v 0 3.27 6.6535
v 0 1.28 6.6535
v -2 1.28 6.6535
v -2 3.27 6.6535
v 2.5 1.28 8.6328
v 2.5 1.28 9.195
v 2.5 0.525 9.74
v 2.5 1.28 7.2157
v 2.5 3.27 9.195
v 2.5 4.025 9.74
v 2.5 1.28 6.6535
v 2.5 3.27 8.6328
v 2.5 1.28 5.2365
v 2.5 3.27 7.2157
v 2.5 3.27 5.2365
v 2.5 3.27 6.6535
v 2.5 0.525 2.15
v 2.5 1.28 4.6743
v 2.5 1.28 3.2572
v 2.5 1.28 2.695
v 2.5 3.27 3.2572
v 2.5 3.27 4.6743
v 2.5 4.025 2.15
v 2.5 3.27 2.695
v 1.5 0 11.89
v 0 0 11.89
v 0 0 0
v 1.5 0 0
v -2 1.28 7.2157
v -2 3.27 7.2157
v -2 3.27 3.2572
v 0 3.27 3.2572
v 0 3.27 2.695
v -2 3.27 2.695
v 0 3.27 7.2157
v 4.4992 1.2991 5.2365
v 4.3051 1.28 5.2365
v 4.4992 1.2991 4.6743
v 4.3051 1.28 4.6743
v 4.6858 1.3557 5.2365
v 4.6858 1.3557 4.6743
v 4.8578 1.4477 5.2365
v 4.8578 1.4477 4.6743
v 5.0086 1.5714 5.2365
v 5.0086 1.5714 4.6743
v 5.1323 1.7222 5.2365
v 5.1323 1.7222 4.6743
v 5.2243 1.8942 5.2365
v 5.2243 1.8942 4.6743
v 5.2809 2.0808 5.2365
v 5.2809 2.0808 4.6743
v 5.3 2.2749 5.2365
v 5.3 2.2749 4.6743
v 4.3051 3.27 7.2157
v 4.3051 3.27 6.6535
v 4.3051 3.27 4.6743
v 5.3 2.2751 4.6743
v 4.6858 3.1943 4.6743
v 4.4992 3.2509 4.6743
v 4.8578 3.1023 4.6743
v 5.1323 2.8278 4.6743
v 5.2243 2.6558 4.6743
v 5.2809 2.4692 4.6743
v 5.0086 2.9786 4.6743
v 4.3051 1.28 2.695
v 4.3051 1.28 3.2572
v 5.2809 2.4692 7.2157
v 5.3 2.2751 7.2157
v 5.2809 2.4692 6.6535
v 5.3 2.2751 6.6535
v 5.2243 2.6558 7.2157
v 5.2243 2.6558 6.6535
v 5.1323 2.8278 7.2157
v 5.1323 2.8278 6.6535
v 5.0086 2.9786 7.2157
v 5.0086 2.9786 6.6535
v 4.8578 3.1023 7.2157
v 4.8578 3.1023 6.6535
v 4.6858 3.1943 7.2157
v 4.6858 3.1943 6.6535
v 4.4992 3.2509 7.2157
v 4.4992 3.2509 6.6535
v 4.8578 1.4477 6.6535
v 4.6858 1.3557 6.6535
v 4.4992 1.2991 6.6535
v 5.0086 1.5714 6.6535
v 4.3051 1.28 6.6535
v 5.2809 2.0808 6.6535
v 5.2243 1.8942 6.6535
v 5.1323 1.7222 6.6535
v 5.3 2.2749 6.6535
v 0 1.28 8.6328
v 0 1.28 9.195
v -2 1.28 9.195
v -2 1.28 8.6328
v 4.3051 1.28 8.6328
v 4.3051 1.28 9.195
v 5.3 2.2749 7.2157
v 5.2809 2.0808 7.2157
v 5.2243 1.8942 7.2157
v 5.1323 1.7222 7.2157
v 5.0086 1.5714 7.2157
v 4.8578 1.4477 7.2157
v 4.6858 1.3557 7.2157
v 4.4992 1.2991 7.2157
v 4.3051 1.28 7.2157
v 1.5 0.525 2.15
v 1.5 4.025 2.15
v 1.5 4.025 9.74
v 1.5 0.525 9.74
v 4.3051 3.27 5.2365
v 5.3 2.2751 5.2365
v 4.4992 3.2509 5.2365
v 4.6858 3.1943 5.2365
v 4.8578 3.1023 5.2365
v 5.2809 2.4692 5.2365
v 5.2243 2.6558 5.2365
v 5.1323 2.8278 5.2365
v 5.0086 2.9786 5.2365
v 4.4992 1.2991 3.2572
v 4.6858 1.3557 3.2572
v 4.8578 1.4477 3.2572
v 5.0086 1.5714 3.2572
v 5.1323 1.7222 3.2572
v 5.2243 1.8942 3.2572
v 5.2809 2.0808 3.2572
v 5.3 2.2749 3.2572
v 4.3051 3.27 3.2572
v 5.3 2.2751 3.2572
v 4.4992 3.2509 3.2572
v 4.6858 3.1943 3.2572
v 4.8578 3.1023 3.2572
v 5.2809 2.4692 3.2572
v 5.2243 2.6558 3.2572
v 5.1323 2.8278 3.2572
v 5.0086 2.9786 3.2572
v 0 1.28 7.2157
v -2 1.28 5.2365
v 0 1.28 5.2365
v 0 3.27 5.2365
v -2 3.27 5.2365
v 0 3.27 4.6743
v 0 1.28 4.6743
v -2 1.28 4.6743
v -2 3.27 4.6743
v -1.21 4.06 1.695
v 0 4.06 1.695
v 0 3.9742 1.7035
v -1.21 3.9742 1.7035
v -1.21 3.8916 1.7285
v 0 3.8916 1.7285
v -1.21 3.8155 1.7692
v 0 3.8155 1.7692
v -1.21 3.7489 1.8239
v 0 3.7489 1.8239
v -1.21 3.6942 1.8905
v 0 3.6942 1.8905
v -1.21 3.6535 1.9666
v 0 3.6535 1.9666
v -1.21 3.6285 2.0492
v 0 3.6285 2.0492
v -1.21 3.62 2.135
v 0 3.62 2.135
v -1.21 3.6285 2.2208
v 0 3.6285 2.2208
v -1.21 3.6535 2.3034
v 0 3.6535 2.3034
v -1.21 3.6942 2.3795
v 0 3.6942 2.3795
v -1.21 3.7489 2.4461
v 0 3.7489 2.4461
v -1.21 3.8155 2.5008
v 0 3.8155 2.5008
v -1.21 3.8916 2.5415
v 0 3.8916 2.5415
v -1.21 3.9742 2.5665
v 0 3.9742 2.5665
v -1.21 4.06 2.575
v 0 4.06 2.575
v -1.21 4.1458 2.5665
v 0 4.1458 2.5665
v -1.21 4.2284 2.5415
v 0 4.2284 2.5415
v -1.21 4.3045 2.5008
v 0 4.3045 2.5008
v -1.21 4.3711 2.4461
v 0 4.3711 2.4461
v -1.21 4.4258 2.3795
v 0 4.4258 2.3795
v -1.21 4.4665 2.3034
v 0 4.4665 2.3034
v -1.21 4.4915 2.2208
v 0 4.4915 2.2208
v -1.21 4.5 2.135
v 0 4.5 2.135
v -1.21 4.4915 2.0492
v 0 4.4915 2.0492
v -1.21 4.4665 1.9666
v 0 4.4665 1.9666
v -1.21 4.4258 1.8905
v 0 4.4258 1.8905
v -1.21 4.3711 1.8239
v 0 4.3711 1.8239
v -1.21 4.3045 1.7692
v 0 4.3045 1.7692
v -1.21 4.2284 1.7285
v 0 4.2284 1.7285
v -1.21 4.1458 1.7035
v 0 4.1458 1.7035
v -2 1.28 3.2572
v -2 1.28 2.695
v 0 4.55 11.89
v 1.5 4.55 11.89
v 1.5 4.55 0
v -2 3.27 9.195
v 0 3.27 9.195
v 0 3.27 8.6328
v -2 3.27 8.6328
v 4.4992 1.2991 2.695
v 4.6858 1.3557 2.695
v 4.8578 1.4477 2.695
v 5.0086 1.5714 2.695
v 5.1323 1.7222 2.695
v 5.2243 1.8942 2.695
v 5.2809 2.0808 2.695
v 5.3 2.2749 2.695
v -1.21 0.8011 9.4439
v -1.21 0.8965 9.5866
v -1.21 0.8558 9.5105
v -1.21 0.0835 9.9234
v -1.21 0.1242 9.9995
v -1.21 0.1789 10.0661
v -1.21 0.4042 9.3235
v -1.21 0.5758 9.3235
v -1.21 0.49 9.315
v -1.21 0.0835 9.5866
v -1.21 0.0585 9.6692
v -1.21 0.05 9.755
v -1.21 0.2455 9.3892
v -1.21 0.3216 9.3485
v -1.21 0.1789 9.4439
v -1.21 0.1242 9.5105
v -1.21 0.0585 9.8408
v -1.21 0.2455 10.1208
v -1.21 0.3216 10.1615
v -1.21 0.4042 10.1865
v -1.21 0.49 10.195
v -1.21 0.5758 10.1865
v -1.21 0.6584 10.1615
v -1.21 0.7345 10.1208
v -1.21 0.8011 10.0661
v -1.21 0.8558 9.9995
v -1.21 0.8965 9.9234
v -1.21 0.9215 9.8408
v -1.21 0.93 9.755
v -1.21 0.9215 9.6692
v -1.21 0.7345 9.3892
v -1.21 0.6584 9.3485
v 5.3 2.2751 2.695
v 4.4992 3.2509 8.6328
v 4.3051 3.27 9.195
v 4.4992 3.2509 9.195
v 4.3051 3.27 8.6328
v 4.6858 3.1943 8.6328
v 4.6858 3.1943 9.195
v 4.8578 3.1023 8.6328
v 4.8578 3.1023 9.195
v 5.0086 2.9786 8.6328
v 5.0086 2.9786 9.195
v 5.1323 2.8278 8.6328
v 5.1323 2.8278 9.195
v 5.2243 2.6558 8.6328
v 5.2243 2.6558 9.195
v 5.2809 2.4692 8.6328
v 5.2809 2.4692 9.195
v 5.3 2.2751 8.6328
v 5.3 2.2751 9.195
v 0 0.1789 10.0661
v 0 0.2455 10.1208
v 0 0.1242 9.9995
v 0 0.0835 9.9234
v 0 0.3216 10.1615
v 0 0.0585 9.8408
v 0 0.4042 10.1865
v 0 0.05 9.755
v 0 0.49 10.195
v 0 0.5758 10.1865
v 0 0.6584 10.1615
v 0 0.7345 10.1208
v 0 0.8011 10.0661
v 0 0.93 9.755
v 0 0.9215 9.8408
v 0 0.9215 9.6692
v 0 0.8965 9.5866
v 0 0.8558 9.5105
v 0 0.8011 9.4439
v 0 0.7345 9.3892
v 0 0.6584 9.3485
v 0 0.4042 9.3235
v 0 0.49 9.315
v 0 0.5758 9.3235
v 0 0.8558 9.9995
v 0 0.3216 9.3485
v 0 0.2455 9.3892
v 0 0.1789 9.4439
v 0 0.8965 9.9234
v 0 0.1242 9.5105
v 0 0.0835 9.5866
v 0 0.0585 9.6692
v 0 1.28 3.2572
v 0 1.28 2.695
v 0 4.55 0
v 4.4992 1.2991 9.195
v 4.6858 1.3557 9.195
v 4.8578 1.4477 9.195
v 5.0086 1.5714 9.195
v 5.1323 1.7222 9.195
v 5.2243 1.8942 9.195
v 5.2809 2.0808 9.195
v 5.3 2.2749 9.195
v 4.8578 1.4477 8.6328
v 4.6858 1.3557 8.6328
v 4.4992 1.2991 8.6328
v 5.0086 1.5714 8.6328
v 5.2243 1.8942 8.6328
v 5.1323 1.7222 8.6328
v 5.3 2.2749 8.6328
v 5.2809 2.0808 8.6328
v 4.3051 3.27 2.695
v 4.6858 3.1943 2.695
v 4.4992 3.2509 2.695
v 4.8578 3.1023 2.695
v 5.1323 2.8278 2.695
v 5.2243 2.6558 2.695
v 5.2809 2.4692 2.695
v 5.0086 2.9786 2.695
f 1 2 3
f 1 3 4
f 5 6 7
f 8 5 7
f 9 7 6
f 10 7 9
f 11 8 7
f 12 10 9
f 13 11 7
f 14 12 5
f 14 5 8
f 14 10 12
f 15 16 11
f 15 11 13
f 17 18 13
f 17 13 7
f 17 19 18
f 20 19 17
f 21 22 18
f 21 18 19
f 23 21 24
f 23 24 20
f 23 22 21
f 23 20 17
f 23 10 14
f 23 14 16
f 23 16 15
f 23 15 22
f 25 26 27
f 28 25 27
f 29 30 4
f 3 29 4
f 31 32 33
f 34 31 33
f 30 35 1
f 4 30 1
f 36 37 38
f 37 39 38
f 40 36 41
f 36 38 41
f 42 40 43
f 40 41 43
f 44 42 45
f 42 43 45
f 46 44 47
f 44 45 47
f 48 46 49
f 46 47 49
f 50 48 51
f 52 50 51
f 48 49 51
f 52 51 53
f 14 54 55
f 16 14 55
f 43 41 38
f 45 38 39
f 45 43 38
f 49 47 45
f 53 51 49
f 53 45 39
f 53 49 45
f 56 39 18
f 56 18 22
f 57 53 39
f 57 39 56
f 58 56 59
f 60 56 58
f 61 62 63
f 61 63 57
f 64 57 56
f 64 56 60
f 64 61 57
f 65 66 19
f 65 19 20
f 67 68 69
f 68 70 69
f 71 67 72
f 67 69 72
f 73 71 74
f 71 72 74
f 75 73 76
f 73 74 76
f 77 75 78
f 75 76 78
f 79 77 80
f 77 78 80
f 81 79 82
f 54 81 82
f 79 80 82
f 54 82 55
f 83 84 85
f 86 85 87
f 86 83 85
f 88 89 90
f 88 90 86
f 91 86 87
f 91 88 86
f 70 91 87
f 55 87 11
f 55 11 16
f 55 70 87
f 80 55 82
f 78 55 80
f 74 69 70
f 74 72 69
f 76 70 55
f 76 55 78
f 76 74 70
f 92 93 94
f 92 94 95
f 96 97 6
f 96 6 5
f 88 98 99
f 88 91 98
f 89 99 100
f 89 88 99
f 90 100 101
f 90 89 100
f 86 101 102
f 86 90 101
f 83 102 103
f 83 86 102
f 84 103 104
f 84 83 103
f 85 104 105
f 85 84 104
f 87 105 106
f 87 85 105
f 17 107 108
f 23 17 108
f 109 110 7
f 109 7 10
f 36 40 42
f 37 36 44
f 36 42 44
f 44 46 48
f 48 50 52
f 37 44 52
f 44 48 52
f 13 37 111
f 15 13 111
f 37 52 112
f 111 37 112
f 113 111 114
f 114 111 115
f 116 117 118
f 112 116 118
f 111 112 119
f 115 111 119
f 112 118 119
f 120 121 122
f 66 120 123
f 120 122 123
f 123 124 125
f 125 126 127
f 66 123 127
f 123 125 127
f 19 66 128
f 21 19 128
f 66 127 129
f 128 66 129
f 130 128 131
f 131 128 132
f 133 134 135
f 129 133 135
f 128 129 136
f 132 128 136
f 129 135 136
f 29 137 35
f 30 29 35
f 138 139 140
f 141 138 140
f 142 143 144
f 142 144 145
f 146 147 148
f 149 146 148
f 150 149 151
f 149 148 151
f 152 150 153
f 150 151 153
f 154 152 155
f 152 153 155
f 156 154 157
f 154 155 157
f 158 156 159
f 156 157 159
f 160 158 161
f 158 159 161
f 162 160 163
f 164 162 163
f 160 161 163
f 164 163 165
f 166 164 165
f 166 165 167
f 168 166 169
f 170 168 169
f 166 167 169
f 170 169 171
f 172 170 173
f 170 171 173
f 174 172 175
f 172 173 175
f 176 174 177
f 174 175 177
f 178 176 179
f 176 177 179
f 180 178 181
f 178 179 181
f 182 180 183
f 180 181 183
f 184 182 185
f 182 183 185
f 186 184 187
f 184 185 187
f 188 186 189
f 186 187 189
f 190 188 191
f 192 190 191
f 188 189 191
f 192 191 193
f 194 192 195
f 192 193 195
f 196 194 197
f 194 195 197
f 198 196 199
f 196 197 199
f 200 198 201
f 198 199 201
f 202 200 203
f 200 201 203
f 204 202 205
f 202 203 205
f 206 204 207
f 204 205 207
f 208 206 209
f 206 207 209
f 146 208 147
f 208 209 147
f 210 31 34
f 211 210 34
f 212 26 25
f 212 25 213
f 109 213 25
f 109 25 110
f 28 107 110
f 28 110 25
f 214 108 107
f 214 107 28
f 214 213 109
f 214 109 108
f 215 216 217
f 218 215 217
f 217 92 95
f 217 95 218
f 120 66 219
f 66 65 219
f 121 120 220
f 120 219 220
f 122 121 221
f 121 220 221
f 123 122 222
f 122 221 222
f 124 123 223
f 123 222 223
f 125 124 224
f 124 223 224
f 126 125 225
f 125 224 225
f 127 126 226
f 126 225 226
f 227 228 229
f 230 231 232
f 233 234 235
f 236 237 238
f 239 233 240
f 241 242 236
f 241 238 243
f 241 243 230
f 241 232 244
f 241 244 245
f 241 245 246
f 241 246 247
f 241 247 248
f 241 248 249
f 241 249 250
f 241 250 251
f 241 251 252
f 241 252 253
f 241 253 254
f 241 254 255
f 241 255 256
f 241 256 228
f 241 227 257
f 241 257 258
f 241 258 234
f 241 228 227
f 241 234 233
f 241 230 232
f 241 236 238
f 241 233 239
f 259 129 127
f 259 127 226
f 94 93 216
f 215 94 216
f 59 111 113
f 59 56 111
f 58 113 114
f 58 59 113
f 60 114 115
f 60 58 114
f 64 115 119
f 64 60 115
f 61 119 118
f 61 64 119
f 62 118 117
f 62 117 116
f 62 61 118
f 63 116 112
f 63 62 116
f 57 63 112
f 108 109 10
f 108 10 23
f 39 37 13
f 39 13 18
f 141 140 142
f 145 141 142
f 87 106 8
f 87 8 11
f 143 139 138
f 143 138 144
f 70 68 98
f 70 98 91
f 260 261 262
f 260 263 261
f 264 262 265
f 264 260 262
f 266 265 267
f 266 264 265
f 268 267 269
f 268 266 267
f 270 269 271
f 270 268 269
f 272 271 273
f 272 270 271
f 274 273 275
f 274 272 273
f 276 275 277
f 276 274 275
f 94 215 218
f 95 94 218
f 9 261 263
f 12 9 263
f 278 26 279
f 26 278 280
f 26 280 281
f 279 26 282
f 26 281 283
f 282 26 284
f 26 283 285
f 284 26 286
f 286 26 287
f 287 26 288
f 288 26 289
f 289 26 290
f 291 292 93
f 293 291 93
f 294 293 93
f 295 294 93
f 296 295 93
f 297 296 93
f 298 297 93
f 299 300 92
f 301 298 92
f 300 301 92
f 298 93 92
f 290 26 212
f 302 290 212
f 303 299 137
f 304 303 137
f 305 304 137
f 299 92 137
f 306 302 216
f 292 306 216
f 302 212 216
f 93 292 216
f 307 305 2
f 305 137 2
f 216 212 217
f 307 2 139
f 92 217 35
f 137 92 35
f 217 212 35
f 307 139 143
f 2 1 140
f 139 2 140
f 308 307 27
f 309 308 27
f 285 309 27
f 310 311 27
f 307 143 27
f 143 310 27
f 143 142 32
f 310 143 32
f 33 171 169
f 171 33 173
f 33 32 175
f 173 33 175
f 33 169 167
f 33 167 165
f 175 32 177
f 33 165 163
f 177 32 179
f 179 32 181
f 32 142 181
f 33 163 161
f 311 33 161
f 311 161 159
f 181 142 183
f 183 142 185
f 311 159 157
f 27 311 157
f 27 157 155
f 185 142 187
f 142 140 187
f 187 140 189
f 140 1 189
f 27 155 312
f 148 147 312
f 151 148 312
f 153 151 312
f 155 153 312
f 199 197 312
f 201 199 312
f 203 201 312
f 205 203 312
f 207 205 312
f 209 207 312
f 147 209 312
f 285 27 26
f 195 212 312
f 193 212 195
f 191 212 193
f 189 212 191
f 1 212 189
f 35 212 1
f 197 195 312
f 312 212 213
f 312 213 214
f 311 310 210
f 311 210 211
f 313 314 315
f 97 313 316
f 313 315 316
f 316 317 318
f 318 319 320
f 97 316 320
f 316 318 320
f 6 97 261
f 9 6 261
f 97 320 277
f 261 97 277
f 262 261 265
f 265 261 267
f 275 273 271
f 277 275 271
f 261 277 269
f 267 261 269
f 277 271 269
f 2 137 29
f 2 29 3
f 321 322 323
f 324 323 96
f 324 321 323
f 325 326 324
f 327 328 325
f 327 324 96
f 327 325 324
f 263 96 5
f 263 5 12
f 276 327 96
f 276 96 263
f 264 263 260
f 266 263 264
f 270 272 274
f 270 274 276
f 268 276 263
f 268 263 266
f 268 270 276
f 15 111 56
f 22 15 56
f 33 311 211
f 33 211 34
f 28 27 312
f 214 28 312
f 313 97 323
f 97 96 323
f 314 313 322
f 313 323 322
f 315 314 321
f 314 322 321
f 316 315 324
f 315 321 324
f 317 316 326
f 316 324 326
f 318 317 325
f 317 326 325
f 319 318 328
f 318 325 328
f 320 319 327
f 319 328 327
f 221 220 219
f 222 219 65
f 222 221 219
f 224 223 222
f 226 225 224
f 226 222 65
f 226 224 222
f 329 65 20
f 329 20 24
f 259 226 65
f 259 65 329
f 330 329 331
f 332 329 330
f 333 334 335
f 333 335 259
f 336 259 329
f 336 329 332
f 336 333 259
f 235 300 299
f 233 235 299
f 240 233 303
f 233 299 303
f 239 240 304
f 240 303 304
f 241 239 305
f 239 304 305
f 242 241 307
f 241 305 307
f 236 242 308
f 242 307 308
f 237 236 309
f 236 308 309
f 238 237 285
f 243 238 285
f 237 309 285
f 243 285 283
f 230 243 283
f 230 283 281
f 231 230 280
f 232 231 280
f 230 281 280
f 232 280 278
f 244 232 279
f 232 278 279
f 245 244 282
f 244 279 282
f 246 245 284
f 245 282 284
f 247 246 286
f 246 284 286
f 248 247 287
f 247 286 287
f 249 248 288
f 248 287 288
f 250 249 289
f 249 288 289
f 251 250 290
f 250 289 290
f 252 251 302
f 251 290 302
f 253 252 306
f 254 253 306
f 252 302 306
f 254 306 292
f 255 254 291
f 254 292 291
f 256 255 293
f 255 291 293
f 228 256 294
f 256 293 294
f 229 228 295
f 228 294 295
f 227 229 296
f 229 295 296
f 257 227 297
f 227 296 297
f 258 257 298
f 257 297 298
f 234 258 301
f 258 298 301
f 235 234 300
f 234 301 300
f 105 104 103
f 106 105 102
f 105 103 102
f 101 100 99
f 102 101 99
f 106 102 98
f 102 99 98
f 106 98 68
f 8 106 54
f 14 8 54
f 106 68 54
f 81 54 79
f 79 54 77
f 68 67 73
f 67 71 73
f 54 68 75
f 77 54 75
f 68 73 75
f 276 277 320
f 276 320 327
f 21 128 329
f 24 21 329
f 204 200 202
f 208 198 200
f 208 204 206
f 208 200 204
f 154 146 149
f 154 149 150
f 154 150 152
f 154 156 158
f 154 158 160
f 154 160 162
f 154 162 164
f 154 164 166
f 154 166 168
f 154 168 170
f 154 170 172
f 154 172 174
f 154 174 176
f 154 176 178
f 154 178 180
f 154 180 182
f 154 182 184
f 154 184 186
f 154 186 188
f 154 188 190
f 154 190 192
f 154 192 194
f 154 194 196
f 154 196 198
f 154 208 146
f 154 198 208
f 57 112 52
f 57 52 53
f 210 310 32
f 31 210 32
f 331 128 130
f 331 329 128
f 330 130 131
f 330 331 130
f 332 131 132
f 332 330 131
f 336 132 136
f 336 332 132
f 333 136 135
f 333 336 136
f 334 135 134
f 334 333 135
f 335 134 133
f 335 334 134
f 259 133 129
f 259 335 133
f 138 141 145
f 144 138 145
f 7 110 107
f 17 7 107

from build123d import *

# Parameters (mm, degrees)
ESQUISSE2_W        = 11.89
ESQUISSE2_H        = 4.55
BOSS_EXTRU_1_DEPTH = 1.5
ESQUISSE7_W        = 7.59
ESQUISSE7_H        = 3.5
BOSS_EXTRU_2_DEPTH = 1
ESQUISSE8_W        = 0.56222282
ESQUISSE8_H        = 1.99
BOSS_EXTRU_4_DEPTH = 7.3
CONG_6_R           = 0.995
ESQUISSE12_R       = 0.44
BOSS_EXTRU_5_DEPTH = 1.21


with BuildPart() as part:
    # Esquisse2 → Boss.-Extru.1 (new body)
    with BuildSketch(Plane(origin=(0, 0, 0), x_dir=(0, 0, -1), z_dir=(1, 0, 0))):
        with Locations((-5.945, 2.275)):
            Rectangle(ESQUISSE2_W, ESQUISSE2_H)
    extrude(amount=BOSS_EXTRU_1_DEPTH)

    # Esquisse7 → Boss.-Extru.2 (add)
    with BuildSketch(Plane(origin=(1.5, 0, 0), x_dir=(0, 0, -1), z_dir=(1, 0, 0))):
        with Locations((-5.945, 2.275)):
            Rectangle(ESQUISSE7_W, ESQUISSE7_H)
    extrude(amount=BOSS_EXTRU_2_DEPTH)

    # Esquisse8 → Boss.-Extru.4 (add)
    with BuildSketch(Plane(origin=(5.3, 0, 0), x_dir=(0, 0, -1), z_dir=(1, 0, 0))):
        with Locations((-6.93462953, 2.275)):
            Rectangle(ESQUISSE8_W, ESQUISSE8_H)
        with Locations((-2.97611141, 2.275)):
            Rectangle(ESQUISSE8_W, ESQUISSE8_H)
        with Locations((-8.91388859, 2.275)):
            Rectangle(ESQUISSE8_W, ESQUISSE8_H)
        with Locations((-4.95537047, 2.275)):
            Rectangle(ESQUISSE8_W, ESQUISSE8_H)
    extrude(amount=-BOSS_EXTRU_4_DEPTH)

    # Congé6
    cong_6_edges = [part.edges().sort_by_distance(p)[0] for p in [
        (5.3, 1.28, 2.97611141),
        (5.3, 1.28, 4.95537047),
        (5.3, 1.28, 6.93462953),
        (5.3, 1.28, 8.91388859),
        (5.3, 3.27, 8.91388859),
        (5.3, 3.27, 6.93462953),
        (5.3, 3.27, 4.95537047),
        (5.3, 3.27, 2.97611141),
    ]]
    fillet(cong_6_edges, radius=CONG_6_R - 0.0001)  # a hair under: the kernel refuses the full size

    # Esquisse12 → Boss.-Extru.5 (add)
    with BuildSketch(Plane.ZY):
        with Locations(Location((2.135, 4.06, 0), (0, 0, 180))):
            Circle(ESQUISSE12_R)
        with Locations(Location((9.755, 0.49, 0), (0, 0, 180))):
            Circle(ESQUISSE12_R)
    extrude(amount=BOSS_EXTRU_5_DEPTH)


solid = part.part
